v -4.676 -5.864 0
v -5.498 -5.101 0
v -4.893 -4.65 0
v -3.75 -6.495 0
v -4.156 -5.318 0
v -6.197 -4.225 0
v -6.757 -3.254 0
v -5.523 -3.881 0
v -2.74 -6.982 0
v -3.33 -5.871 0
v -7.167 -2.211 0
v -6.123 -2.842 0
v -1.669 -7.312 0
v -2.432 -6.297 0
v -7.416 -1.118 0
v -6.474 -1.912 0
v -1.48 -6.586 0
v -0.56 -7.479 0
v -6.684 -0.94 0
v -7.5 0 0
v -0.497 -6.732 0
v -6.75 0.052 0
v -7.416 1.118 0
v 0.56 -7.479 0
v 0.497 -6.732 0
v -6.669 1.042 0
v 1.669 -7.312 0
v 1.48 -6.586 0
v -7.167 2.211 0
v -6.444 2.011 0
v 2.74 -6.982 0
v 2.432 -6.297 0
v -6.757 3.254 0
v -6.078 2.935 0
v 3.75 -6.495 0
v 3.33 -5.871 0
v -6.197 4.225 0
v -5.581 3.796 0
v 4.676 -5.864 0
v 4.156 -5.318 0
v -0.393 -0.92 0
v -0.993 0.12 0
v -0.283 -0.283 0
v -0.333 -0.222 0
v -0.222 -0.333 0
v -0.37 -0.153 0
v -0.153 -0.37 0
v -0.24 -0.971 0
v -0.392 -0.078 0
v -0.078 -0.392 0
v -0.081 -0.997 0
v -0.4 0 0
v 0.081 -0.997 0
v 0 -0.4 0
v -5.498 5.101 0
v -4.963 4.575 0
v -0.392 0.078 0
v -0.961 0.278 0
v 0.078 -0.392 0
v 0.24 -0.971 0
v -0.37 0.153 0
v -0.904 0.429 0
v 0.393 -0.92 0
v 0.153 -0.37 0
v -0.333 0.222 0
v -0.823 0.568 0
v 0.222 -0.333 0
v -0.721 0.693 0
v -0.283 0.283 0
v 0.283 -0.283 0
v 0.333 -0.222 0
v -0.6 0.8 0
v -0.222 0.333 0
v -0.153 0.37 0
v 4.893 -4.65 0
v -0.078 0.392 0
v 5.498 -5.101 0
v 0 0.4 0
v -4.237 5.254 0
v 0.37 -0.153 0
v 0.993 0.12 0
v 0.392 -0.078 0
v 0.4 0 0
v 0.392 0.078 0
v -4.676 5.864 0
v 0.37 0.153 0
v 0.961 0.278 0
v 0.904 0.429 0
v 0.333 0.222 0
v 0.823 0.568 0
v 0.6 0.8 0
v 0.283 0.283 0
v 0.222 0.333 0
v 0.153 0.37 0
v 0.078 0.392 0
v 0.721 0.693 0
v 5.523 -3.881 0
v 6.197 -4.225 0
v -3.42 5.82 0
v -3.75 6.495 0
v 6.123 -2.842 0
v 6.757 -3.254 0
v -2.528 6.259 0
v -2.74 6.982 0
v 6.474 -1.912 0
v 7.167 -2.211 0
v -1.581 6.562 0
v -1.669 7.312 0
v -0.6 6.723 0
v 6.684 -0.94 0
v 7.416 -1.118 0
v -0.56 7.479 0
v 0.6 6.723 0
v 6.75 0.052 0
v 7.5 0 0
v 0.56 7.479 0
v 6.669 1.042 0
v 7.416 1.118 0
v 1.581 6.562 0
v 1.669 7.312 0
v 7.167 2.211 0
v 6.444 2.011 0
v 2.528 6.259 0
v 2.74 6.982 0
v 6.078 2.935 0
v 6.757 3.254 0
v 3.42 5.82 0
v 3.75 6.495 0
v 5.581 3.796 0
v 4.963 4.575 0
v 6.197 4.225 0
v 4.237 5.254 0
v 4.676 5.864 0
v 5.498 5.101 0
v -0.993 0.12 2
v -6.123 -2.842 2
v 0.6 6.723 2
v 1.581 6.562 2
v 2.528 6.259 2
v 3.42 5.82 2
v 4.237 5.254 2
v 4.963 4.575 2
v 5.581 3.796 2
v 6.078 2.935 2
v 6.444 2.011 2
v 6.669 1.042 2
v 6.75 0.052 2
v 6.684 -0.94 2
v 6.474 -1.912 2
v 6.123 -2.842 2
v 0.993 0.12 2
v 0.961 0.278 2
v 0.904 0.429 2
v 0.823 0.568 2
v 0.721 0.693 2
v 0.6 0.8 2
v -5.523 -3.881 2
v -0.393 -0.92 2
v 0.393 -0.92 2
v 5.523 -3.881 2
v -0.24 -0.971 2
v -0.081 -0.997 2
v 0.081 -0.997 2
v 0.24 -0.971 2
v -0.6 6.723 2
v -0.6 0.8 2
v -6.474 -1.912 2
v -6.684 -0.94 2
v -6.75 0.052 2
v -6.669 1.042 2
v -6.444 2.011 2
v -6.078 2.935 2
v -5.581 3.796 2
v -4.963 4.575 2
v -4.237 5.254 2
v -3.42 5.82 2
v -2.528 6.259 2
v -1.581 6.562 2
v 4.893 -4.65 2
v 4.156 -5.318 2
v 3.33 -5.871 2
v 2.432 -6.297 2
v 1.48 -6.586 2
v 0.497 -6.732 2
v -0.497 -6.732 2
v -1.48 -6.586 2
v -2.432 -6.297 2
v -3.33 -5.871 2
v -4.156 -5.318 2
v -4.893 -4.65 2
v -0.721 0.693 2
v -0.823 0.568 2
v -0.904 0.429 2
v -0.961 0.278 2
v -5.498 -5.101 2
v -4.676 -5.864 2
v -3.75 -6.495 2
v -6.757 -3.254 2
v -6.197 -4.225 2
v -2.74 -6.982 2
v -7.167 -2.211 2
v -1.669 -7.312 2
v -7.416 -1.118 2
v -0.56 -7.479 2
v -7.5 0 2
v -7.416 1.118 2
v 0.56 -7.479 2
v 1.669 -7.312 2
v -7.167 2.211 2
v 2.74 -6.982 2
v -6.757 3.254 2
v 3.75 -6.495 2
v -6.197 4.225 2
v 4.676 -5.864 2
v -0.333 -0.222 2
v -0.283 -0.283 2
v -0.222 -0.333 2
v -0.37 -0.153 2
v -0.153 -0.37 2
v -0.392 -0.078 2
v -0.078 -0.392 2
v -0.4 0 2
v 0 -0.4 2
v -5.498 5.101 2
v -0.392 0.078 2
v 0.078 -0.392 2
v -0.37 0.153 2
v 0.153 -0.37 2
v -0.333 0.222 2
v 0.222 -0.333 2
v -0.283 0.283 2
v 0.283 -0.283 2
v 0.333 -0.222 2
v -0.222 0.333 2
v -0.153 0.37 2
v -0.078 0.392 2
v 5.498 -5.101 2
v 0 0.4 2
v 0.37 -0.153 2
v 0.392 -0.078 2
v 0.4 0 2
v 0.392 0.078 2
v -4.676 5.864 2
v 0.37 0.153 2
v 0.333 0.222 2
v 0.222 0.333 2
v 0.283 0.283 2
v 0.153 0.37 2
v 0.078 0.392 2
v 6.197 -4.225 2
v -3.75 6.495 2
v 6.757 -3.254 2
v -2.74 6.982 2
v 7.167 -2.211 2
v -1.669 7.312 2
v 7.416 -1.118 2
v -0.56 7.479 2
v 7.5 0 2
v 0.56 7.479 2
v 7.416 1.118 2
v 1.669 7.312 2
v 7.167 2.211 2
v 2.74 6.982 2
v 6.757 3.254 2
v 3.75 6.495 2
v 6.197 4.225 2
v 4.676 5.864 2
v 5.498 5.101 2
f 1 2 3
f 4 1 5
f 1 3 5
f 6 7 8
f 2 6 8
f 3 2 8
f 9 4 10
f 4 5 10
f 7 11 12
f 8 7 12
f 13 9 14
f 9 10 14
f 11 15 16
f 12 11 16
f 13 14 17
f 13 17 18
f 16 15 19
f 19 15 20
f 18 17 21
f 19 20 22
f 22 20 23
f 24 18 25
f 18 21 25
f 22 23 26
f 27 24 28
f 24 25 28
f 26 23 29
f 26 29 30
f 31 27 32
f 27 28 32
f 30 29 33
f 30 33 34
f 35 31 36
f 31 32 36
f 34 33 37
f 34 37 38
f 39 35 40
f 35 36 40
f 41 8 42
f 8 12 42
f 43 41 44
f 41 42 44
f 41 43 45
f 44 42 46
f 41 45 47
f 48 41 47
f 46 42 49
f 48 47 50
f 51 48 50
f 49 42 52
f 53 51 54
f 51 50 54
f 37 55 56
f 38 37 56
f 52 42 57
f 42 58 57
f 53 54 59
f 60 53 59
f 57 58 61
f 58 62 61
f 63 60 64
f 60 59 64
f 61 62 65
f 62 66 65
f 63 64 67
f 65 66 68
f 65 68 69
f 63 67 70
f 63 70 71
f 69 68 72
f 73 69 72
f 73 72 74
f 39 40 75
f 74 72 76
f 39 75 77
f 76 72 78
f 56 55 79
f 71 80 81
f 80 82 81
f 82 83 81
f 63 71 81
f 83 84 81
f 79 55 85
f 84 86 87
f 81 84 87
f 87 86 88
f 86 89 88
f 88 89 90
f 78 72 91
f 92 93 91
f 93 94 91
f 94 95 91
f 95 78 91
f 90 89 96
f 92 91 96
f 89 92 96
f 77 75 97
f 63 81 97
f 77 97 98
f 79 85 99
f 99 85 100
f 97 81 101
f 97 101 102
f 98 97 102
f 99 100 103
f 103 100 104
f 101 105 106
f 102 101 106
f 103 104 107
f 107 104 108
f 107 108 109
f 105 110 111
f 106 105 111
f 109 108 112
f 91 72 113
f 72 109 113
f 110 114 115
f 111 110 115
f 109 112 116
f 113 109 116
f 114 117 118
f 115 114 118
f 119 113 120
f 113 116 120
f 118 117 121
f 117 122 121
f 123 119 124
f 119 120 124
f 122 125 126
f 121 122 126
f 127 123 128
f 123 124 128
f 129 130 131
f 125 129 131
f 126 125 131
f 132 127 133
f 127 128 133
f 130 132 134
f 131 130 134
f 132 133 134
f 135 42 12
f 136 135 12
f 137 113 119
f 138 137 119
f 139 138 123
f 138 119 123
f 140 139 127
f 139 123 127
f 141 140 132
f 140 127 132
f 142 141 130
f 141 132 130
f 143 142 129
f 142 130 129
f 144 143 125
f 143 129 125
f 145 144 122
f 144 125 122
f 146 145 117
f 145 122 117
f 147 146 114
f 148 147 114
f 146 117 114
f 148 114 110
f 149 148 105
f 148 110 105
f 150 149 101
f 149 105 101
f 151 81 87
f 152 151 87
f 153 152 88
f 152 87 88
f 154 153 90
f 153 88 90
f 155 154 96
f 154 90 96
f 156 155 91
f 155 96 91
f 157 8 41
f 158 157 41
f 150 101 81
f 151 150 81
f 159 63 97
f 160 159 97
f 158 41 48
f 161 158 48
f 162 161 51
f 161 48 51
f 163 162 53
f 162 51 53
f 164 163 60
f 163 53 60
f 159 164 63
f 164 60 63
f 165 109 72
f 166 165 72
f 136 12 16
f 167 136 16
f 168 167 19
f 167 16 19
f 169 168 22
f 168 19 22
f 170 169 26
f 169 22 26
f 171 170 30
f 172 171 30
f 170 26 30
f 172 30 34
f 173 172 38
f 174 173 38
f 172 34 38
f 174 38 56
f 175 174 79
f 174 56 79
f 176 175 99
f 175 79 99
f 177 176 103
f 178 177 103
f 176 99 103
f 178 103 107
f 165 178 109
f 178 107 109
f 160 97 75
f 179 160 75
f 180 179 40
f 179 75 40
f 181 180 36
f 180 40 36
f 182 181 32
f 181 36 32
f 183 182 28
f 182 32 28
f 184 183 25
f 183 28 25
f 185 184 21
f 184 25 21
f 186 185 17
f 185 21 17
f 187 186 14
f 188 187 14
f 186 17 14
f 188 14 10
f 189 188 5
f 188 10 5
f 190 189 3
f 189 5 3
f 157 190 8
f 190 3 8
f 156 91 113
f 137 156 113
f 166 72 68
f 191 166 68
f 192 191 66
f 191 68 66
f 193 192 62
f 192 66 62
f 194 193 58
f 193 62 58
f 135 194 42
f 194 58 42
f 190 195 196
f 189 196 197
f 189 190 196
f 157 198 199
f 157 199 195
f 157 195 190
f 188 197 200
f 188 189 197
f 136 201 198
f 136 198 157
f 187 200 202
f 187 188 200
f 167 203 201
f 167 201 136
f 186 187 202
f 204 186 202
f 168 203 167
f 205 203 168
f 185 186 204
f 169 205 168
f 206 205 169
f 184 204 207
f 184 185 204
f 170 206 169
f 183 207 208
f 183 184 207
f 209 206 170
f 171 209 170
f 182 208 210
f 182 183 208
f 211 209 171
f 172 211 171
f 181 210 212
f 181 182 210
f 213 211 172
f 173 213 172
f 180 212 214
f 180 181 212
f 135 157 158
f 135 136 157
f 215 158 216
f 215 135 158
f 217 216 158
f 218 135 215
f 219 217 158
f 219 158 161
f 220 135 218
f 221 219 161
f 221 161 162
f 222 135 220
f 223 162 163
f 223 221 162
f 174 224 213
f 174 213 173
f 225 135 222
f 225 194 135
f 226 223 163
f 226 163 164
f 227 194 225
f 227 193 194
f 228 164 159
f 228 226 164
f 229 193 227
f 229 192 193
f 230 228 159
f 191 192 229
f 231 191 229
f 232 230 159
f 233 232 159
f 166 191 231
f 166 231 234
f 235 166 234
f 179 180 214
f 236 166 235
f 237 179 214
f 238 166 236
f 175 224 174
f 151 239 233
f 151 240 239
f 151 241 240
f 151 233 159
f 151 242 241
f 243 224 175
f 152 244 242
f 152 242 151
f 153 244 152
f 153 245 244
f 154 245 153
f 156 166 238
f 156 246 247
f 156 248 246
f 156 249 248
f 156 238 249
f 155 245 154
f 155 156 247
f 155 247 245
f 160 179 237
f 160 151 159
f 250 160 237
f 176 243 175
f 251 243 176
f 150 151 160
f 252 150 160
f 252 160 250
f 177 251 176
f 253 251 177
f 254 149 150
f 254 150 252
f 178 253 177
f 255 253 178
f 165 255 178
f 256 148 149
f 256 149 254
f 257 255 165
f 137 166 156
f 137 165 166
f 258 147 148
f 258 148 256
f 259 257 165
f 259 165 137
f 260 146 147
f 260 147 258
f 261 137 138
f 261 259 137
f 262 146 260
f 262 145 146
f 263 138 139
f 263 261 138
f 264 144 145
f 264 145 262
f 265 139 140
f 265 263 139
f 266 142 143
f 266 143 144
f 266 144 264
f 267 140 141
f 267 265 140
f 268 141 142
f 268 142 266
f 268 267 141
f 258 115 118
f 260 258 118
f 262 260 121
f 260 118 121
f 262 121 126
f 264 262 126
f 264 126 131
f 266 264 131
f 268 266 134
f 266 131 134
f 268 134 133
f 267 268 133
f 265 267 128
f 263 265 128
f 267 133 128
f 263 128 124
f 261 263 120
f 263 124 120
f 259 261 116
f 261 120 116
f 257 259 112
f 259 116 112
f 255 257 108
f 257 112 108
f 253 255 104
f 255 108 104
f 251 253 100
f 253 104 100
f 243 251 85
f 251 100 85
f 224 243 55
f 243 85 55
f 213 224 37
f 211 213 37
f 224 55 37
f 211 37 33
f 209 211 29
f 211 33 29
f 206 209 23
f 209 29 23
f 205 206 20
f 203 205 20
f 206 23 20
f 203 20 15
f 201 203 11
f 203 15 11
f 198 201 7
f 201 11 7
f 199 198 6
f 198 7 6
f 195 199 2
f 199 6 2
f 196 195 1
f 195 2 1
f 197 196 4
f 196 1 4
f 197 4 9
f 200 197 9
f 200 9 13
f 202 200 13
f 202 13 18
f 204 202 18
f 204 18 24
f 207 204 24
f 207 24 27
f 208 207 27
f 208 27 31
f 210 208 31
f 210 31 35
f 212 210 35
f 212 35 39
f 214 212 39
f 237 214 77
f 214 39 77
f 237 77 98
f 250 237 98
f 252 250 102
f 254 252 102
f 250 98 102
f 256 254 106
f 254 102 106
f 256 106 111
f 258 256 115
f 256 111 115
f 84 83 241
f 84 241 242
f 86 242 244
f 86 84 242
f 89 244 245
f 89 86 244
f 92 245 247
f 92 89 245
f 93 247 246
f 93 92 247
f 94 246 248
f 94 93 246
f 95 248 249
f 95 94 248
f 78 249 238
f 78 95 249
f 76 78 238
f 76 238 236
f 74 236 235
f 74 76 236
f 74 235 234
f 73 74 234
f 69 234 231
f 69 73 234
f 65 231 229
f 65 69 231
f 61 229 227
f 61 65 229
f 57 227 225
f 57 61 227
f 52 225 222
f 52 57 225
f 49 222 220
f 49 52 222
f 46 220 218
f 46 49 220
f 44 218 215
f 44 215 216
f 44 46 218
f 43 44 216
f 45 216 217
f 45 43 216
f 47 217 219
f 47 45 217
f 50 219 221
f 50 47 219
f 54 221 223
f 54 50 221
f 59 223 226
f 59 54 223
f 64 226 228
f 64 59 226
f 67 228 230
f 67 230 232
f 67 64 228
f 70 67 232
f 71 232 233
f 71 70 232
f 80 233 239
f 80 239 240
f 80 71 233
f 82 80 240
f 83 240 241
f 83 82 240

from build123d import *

# Parameters (mm, degrees)
SKETCH1_R           = 7.5
SKETCH1_R_2         = 0.4
BOSS_EXTRUDE1_DEPTH = 2


with BuildPart() as part:
    # Sketch1 → Boss-Extrude1 (new body)
    with BuildSketch(Plane.XY):
        Circle(SKETCH1_R)
        with BuildLine():
            Line((-0.6, 6.723280449), (-0.6, 0.8))
            ThreePointArc((-0.6, 0.8), (-0.866025404, 0.5), (-0.992820323, 0.119615242))
            Line((-0.992820323, 0.119615242), (-6.122531666, -2.842024982))
            ThreePointArc((-6.122531666, -2.842024982), (-5.845671476, 3.375), (-0.6, 6.723280449))
        make_face(mode=Mode.SUBTRACT)
        with BuildLine():
            Line((-5.522531666, -3.881255467), (-0.392820323, -0.919615242))
            ThreePointArc((-0.392820323, -0.919615242), (0, -1), (0.392820323, -0.919615242))
            Line((0.392820323, -0.919615242), (5.522531666, -3.881255467))
            ThreePointArc((5.522531666, -3.881255467), (0, -6.75), (-5.522531666, -3.881255467))
        make_face(mode=Mode.SUBTRACT)
        with BuildLine():
            Line((6.122531666, -2.842024982), (0.992820323, 0.119615242))
            ThreePointArc((0.992820323, 0.119615242), (0.866025404, 0.5), (0.6, 0.8))
            Line((0.6, 0.8), (0.6, 6.723280449))
            ThreePointArc((0.6, 6.723280449), (5.845671476, 3.375), (6.122531666, -2.842024982))
        make_face(mode=Mode.SUBTRACT)
        Circle(SKETCH1_R_2, mode=Mode.SUBTRACT)
    extrude(amount=BOSS_EXTRUDE1_DEPTH)


solid = part.part
